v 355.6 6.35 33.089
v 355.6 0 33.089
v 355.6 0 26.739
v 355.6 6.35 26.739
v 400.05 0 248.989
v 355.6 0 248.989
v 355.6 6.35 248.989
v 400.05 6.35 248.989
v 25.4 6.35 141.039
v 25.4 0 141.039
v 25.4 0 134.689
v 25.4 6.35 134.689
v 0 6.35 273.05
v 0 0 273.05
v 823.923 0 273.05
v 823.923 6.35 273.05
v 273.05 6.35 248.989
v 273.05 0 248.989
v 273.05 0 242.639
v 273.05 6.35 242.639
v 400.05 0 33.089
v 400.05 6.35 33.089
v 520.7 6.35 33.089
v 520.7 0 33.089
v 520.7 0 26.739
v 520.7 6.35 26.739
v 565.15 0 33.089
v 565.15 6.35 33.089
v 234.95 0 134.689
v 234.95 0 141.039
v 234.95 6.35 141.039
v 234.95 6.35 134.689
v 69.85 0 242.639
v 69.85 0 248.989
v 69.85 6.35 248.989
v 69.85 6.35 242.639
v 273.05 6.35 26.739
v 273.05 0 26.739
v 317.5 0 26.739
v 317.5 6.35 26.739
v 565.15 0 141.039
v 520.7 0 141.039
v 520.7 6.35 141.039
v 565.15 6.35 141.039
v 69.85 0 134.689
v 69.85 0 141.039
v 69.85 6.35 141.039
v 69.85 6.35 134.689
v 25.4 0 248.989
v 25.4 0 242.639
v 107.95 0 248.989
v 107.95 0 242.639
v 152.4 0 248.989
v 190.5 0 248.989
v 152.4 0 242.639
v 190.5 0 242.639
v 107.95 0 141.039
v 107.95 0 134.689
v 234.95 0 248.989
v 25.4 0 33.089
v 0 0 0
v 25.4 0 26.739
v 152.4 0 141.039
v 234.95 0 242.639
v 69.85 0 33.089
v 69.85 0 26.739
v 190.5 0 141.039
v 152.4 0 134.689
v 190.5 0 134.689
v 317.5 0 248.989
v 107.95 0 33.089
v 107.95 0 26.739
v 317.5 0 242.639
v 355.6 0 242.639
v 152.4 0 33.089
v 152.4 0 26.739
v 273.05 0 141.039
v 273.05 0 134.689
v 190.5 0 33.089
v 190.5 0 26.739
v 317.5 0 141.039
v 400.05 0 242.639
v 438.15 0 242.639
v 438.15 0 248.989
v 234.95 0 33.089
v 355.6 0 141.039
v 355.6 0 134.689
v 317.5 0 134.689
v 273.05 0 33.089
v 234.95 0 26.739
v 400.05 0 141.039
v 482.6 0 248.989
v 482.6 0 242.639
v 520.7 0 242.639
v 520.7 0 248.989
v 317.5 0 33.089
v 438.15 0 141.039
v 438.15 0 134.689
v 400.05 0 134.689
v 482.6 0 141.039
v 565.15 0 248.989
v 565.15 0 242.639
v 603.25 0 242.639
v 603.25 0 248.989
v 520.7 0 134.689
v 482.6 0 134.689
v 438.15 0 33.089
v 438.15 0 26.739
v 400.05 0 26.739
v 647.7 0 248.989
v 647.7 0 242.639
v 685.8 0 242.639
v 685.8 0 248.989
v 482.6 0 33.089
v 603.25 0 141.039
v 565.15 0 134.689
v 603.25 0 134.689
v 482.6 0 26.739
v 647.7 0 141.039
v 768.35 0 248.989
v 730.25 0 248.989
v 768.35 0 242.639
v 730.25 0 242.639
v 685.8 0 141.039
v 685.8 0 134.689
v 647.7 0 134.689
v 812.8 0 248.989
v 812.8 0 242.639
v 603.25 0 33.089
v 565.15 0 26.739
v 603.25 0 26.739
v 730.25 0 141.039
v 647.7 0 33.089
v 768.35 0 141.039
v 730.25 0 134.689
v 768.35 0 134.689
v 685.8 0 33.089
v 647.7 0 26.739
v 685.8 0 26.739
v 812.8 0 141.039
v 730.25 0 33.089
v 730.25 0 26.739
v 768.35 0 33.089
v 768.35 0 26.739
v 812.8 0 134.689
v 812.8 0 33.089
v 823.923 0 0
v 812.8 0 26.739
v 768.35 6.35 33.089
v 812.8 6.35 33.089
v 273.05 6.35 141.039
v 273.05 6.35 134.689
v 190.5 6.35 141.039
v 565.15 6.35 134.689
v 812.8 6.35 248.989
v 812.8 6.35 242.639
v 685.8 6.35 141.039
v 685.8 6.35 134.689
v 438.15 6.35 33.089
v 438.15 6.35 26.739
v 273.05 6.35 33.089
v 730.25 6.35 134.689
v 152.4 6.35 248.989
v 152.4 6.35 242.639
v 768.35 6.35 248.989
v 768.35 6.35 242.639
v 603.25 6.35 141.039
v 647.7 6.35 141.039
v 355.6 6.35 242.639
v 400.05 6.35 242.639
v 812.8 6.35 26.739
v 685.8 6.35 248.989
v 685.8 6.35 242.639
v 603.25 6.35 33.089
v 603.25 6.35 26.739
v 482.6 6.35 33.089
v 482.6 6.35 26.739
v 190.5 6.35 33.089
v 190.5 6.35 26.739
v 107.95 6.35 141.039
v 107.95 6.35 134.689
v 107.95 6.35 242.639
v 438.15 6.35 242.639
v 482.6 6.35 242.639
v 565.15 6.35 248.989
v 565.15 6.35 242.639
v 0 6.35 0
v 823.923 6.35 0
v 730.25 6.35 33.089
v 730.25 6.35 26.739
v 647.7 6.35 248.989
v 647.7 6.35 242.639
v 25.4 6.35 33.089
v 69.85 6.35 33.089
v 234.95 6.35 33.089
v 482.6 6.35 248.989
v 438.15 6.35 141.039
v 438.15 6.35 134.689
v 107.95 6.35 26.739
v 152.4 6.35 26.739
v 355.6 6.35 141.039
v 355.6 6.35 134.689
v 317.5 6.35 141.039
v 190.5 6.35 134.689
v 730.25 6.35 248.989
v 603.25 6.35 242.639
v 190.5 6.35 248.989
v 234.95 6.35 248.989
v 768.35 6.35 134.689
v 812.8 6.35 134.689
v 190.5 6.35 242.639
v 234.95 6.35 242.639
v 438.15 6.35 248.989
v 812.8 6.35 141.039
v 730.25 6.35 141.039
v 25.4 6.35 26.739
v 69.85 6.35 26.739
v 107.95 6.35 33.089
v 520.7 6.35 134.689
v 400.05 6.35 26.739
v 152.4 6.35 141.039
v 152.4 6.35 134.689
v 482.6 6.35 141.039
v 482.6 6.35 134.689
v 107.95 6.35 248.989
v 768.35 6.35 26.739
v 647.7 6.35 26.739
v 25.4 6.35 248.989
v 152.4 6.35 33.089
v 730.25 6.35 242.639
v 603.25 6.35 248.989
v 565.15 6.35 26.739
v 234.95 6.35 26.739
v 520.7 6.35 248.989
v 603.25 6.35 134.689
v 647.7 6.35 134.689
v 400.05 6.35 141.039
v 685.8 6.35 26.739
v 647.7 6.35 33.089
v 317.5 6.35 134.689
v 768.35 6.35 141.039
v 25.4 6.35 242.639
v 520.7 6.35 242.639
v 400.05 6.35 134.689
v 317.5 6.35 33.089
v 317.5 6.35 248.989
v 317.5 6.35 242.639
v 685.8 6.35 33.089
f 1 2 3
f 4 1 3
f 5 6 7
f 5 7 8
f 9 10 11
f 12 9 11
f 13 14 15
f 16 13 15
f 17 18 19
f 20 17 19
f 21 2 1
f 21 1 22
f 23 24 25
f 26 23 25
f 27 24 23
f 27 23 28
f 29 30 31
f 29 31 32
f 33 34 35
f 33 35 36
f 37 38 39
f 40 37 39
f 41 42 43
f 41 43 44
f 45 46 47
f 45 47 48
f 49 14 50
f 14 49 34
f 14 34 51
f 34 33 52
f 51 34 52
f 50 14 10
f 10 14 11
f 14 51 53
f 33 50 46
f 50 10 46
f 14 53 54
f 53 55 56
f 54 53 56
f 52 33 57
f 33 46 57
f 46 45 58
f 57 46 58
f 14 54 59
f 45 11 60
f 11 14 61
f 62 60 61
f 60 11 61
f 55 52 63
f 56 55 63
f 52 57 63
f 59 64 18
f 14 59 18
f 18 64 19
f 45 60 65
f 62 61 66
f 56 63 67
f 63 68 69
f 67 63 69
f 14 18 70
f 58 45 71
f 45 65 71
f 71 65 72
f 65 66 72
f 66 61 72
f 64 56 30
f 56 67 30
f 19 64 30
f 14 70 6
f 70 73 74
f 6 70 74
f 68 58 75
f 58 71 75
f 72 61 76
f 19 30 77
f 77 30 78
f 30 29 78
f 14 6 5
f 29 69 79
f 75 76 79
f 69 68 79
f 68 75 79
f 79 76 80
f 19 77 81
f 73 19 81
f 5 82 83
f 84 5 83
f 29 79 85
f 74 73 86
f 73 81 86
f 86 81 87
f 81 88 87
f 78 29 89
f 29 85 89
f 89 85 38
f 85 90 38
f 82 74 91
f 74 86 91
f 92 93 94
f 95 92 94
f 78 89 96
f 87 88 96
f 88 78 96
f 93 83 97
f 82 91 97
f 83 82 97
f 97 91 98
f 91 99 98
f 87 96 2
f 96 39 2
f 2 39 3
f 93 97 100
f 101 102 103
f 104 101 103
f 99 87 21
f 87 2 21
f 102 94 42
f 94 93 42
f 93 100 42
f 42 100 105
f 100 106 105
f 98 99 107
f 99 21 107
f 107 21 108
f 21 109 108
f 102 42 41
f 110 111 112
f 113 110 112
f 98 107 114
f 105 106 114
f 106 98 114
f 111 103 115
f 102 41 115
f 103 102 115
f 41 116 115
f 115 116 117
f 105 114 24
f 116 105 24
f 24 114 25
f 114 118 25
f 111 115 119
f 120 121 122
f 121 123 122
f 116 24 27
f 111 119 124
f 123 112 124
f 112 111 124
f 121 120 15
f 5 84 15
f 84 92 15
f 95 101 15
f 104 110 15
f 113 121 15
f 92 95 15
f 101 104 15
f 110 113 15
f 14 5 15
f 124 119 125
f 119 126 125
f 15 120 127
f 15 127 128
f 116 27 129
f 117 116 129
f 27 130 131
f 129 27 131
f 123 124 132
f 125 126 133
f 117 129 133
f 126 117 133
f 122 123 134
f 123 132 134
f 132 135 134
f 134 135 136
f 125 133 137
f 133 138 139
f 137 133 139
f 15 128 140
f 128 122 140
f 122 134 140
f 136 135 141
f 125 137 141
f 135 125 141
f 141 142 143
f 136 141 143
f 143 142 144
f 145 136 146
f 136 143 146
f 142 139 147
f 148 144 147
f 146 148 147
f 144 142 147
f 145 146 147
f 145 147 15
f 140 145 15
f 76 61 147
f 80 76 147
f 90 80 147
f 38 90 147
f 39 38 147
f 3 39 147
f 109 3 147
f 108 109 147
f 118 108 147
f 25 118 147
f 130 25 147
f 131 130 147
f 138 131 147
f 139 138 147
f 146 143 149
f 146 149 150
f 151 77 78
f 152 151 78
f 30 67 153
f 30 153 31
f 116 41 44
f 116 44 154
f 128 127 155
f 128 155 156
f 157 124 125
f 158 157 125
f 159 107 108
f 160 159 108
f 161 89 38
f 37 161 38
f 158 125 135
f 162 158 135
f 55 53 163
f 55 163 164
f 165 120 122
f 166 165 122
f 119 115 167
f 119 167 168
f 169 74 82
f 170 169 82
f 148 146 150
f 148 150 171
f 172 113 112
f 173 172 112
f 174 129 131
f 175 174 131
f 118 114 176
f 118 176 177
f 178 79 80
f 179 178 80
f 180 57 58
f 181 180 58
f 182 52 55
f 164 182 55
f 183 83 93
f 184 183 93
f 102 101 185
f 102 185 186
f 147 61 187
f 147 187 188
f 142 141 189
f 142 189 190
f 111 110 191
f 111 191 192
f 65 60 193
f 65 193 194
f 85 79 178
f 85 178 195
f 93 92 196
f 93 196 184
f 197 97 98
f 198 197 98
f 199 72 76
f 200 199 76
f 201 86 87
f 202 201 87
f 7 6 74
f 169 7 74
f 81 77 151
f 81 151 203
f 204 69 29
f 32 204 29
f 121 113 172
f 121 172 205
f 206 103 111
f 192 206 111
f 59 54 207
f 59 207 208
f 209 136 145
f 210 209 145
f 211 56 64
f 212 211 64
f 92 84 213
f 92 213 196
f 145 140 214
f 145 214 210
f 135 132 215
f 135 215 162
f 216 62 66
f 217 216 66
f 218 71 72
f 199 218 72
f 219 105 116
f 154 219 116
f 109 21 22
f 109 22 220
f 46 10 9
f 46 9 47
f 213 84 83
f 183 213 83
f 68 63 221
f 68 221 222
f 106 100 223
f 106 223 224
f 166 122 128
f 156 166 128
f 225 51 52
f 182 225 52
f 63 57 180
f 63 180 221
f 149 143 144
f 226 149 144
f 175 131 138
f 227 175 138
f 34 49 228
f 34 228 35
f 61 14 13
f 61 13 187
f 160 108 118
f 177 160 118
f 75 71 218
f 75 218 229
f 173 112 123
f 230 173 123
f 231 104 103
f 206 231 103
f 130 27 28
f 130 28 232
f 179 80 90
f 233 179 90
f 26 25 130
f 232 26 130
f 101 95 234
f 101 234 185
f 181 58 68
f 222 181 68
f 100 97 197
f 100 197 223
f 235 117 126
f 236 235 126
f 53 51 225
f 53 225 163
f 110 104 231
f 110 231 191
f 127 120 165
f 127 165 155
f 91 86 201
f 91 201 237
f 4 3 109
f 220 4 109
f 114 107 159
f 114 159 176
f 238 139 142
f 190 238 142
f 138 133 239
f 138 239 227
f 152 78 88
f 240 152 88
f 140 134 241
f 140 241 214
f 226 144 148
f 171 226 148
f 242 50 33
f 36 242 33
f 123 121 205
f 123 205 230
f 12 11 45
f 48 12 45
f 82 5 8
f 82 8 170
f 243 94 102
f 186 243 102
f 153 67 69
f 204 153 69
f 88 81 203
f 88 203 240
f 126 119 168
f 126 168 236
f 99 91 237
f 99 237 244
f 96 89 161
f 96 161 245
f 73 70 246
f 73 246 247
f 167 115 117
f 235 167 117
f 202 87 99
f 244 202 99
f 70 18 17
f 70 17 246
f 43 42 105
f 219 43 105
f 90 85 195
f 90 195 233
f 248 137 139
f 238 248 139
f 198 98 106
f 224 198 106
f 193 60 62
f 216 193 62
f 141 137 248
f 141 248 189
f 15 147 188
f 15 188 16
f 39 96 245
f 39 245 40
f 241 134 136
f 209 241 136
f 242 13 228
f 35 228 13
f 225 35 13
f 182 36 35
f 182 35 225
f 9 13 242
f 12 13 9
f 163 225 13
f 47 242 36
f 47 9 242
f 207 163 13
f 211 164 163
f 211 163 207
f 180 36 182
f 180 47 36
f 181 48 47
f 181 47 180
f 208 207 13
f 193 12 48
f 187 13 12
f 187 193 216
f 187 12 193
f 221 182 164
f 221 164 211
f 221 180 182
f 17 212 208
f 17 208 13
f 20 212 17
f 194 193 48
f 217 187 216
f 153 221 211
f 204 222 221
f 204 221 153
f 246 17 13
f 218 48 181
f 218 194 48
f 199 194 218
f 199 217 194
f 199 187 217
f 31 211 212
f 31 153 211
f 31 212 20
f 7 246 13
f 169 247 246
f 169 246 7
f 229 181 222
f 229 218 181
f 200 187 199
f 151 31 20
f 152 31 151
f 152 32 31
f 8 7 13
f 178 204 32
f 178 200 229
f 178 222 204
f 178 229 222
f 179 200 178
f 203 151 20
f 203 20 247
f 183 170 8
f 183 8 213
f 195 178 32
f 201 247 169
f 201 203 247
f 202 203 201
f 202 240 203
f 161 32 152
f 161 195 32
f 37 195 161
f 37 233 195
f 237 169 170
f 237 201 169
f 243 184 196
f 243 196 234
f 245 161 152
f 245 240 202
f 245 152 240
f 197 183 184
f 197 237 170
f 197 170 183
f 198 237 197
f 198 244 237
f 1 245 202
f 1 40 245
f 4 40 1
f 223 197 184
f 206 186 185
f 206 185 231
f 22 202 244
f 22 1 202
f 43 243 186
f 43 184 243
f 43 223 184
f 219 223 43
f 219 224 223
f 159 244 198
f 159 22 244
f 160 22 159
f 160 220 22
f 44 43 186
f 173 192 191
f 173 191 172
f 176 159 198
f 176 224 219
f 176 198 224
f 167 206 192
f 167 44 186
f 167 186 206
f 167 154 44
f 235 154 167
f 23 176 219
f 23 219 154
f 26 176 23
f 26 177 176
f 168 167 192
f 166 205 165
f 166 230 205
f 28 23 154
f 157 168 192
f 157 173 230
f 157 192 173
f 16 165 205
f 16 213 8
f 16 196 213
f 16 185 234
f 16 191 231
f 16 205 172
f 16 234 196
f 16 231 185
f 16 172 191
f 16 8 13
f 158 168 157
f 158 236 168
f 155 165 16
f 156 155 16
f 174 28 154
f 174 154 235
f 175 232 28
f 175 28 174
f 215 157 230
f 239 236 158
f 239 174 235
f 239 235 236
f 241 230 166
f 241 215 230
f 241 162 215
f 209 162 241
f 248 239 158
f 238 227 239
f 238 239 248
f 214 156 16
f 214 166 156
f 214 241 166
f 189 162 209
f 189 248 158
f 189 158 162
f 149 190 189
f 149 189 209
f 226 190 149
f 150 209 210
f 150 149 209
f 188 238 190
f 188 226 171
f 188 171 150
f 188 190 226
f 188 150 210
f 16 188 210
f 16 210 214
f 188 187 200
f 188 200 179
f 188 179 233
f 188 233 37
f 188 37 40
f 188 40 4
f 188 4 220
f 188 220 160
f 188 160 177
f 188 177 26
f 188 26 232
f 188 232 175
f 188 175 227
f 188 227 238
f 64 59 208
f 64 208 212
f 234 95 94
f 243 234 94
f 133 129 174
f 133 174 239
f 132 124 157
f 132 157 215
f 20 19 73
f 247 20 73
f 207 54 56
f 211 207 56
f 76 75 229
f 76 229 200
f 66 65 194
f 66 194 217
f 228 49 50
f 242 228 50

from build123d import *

# Parameters (mm, degrees)
SKETCH1_W               = 939.8
SKETCH1_H               = 273.05
BOSS_EXTRUDE1_DEPTH     = 6.35
CUT_EXTRUDE1_DEPTH      = 979.683127984
CUT_EXTRUDE1_DEPTH_BACK = 979.683127984
SKETCH2_W               = 44.45
SKETCH2_H               = 6.35
SKETCH2_W_2             = 88.9
SKETCH3_W               = 115.877039993
SKETCH3_H               = 273.05
CUT_EXTRUDE2_DEPTH      = 6.35


with BuildPart() as part:
    # Sketch1 → Boss-Extrude1 (new body)
    with BuildSketch(Plane(origin=(0, 0, 0), x_dir=(1, 0, 0), z_dir=(0, 1, 0))):
        with Locations((469.9, -136.525)):
            Rectangle(SKETCH1_W, SKETCH1_H)
    extrude(amount=BOSS_EXTRUDE1_DEPTH)

    # Sketch2 → Cut-Extrude1 (cut, two sides: drawn at the far end of the back side and taken through both)
    with BuildSketch(Plane(origin=(0, 6.35, 0), x_dir=(1, 0, 0), z_dir=(0, 1, 0)).offset(-CUT_EXTRUDE1_DEPTH_BACK)):
        with Locations((47.625, -29.913697199)):
            Rectangle(SKETCH2_W, SKETCH2_H)
        with Locations((130.175, -29.913697199)):
            Rectangle(SKETCH2_W, SKETCH2_H)
        with Locations((212.725, -29.913697199)):
            Rectangle(SKETCH2_W, SKETCH2_H)
        with Locations((295.275, -29.913697199)):
            Rectangle(SKETCH2_W, SKETCH2_H)
        with Locations((377.825, -29.913697199)):
            Rectangle(SKETCH2_W, SKETCH2_H)
        with Locations((460.375, -29.913697199)):
            Rectangle(SKETCH2_W, SKETCH2_H)
        with Locations((542.925, -29.913697199)):
            Rectangle(SKETCH2_W, SKETCH2_H)
        with Locations((625.475, -29.913697199)):
            Rectangle(SKETCH2_W, SKETCH2_H)
        with Locations((708.025, -29.913697199)):
            Rectangle(SKETCH2_W, SKETCH2_H)
        with Locations((790.575, -29.913697199)):
            Rectangle(SKETCH2_W, SKETCH2_H)
        with Locations((130.175, -137.863697199)):
            Rectangle(SKETCH2_W, SKETCH2_H)
        with Locations((212.725, -137.863697199)):
            Rectangle(SKETCH2_W, SKETCH2_H)
        with Locations((295.275, -137.863697199)):
            Rectangle(SKETCH2_W, SKETCH2_H)
        with Locations((377.825, -137.863697199)):
            Rectangle(SKETCH2_W, SKETCH2_H)
        with Locations((460.375, -137.863697199)):
            Rectangle(SKETCH2_W, SKETCH2_H)
        with Locations((542.925, -137.863697199)):
            Rectangle(SKETCH2_W, SKETCH2_H)
        with Locations((625.475, -137.863697199)):
            Rectangle(SKETCH2_W, SKETCH2_H)
        with Locations((708.025, -137.863697199)):
            Rectangle(SKETCH2_W, SKETCH2_H)
        with Locations((790.575, -137.863697199)):
            Rectangle(SKETCH2_W, SKETCH2_H)
        with Locations((130.175, -245.813697199)):
            Rectangle(SKETCH2_W, SKETCH2_H)
        with Locations((212.725, -245.813697199)):
            Rectangle(SKETCH2_W, SKETCH2_H)
        with Locations((295.275, -245.813697199)):
            Rectangle(SKETCH2_W, SKETCH2_H)
        with Locations((377.825, -245.813697199)):
            Rectangle(SKETCH2_W, SKETCH2_H)
        with Locations((460.375, -245.813697199)):
            Rectangle(SKETCH2_W, SKETCH2_H)
        with Locations((542.925, -245.813697199)):
            Rectangle(SKETCH2_W, SKETCH2_H)
        with Locations((625.475, -245.813697199)):
            Rectangle(SKETCH2_W, SKETCH2_H)
        with Locations((708.025, -245.813697199)):
            Rectangle(SKETCH2_W, SKETCH2_H)
        with Locations((790.575, -245.813697199)):
            Rectangle(SKETCH2_W, SKETCH2_H)
        with Locations((47.625, -137.863697199)):
            Rectangle(SKETCH2_W, SKETCH2_H)
        with Locations((47.625, -245.813697199)):
            Rectangle(SKETCH2_W, SKETCH2_H)
        with Locations((895.35, -137.863697199)):
            Rectangle(SKETCH2_W_2, SKETCH2_H)
        with Locations((895.35, -29.913697199)):
            Rectangle(SKETCH2_W_2, SKETCH2_H)
        with Locations((895.35, -245.813697199)):
            Rectangle(SKETCH2_W_2, SKETCH2_H)
    extrude(amount=CUT_EXTRUDE1_DEPTH + CUT_EXTRUDE1_DEPTH_BACK, mode=Mode.SUBTRACT)

    # Sketch3 → Cut-Extrude2 (cut)
    with BuildSketch(Plane.XZ):
        with Locations((881.861480003, 136.525)):
            Rectangle(SKETCH3_W, SKETCH3_H)
    extrude(amount=-CUT_EXTRUDE2_DEPTH, mode=Mode.SUBTRACT)


solid = part.part
